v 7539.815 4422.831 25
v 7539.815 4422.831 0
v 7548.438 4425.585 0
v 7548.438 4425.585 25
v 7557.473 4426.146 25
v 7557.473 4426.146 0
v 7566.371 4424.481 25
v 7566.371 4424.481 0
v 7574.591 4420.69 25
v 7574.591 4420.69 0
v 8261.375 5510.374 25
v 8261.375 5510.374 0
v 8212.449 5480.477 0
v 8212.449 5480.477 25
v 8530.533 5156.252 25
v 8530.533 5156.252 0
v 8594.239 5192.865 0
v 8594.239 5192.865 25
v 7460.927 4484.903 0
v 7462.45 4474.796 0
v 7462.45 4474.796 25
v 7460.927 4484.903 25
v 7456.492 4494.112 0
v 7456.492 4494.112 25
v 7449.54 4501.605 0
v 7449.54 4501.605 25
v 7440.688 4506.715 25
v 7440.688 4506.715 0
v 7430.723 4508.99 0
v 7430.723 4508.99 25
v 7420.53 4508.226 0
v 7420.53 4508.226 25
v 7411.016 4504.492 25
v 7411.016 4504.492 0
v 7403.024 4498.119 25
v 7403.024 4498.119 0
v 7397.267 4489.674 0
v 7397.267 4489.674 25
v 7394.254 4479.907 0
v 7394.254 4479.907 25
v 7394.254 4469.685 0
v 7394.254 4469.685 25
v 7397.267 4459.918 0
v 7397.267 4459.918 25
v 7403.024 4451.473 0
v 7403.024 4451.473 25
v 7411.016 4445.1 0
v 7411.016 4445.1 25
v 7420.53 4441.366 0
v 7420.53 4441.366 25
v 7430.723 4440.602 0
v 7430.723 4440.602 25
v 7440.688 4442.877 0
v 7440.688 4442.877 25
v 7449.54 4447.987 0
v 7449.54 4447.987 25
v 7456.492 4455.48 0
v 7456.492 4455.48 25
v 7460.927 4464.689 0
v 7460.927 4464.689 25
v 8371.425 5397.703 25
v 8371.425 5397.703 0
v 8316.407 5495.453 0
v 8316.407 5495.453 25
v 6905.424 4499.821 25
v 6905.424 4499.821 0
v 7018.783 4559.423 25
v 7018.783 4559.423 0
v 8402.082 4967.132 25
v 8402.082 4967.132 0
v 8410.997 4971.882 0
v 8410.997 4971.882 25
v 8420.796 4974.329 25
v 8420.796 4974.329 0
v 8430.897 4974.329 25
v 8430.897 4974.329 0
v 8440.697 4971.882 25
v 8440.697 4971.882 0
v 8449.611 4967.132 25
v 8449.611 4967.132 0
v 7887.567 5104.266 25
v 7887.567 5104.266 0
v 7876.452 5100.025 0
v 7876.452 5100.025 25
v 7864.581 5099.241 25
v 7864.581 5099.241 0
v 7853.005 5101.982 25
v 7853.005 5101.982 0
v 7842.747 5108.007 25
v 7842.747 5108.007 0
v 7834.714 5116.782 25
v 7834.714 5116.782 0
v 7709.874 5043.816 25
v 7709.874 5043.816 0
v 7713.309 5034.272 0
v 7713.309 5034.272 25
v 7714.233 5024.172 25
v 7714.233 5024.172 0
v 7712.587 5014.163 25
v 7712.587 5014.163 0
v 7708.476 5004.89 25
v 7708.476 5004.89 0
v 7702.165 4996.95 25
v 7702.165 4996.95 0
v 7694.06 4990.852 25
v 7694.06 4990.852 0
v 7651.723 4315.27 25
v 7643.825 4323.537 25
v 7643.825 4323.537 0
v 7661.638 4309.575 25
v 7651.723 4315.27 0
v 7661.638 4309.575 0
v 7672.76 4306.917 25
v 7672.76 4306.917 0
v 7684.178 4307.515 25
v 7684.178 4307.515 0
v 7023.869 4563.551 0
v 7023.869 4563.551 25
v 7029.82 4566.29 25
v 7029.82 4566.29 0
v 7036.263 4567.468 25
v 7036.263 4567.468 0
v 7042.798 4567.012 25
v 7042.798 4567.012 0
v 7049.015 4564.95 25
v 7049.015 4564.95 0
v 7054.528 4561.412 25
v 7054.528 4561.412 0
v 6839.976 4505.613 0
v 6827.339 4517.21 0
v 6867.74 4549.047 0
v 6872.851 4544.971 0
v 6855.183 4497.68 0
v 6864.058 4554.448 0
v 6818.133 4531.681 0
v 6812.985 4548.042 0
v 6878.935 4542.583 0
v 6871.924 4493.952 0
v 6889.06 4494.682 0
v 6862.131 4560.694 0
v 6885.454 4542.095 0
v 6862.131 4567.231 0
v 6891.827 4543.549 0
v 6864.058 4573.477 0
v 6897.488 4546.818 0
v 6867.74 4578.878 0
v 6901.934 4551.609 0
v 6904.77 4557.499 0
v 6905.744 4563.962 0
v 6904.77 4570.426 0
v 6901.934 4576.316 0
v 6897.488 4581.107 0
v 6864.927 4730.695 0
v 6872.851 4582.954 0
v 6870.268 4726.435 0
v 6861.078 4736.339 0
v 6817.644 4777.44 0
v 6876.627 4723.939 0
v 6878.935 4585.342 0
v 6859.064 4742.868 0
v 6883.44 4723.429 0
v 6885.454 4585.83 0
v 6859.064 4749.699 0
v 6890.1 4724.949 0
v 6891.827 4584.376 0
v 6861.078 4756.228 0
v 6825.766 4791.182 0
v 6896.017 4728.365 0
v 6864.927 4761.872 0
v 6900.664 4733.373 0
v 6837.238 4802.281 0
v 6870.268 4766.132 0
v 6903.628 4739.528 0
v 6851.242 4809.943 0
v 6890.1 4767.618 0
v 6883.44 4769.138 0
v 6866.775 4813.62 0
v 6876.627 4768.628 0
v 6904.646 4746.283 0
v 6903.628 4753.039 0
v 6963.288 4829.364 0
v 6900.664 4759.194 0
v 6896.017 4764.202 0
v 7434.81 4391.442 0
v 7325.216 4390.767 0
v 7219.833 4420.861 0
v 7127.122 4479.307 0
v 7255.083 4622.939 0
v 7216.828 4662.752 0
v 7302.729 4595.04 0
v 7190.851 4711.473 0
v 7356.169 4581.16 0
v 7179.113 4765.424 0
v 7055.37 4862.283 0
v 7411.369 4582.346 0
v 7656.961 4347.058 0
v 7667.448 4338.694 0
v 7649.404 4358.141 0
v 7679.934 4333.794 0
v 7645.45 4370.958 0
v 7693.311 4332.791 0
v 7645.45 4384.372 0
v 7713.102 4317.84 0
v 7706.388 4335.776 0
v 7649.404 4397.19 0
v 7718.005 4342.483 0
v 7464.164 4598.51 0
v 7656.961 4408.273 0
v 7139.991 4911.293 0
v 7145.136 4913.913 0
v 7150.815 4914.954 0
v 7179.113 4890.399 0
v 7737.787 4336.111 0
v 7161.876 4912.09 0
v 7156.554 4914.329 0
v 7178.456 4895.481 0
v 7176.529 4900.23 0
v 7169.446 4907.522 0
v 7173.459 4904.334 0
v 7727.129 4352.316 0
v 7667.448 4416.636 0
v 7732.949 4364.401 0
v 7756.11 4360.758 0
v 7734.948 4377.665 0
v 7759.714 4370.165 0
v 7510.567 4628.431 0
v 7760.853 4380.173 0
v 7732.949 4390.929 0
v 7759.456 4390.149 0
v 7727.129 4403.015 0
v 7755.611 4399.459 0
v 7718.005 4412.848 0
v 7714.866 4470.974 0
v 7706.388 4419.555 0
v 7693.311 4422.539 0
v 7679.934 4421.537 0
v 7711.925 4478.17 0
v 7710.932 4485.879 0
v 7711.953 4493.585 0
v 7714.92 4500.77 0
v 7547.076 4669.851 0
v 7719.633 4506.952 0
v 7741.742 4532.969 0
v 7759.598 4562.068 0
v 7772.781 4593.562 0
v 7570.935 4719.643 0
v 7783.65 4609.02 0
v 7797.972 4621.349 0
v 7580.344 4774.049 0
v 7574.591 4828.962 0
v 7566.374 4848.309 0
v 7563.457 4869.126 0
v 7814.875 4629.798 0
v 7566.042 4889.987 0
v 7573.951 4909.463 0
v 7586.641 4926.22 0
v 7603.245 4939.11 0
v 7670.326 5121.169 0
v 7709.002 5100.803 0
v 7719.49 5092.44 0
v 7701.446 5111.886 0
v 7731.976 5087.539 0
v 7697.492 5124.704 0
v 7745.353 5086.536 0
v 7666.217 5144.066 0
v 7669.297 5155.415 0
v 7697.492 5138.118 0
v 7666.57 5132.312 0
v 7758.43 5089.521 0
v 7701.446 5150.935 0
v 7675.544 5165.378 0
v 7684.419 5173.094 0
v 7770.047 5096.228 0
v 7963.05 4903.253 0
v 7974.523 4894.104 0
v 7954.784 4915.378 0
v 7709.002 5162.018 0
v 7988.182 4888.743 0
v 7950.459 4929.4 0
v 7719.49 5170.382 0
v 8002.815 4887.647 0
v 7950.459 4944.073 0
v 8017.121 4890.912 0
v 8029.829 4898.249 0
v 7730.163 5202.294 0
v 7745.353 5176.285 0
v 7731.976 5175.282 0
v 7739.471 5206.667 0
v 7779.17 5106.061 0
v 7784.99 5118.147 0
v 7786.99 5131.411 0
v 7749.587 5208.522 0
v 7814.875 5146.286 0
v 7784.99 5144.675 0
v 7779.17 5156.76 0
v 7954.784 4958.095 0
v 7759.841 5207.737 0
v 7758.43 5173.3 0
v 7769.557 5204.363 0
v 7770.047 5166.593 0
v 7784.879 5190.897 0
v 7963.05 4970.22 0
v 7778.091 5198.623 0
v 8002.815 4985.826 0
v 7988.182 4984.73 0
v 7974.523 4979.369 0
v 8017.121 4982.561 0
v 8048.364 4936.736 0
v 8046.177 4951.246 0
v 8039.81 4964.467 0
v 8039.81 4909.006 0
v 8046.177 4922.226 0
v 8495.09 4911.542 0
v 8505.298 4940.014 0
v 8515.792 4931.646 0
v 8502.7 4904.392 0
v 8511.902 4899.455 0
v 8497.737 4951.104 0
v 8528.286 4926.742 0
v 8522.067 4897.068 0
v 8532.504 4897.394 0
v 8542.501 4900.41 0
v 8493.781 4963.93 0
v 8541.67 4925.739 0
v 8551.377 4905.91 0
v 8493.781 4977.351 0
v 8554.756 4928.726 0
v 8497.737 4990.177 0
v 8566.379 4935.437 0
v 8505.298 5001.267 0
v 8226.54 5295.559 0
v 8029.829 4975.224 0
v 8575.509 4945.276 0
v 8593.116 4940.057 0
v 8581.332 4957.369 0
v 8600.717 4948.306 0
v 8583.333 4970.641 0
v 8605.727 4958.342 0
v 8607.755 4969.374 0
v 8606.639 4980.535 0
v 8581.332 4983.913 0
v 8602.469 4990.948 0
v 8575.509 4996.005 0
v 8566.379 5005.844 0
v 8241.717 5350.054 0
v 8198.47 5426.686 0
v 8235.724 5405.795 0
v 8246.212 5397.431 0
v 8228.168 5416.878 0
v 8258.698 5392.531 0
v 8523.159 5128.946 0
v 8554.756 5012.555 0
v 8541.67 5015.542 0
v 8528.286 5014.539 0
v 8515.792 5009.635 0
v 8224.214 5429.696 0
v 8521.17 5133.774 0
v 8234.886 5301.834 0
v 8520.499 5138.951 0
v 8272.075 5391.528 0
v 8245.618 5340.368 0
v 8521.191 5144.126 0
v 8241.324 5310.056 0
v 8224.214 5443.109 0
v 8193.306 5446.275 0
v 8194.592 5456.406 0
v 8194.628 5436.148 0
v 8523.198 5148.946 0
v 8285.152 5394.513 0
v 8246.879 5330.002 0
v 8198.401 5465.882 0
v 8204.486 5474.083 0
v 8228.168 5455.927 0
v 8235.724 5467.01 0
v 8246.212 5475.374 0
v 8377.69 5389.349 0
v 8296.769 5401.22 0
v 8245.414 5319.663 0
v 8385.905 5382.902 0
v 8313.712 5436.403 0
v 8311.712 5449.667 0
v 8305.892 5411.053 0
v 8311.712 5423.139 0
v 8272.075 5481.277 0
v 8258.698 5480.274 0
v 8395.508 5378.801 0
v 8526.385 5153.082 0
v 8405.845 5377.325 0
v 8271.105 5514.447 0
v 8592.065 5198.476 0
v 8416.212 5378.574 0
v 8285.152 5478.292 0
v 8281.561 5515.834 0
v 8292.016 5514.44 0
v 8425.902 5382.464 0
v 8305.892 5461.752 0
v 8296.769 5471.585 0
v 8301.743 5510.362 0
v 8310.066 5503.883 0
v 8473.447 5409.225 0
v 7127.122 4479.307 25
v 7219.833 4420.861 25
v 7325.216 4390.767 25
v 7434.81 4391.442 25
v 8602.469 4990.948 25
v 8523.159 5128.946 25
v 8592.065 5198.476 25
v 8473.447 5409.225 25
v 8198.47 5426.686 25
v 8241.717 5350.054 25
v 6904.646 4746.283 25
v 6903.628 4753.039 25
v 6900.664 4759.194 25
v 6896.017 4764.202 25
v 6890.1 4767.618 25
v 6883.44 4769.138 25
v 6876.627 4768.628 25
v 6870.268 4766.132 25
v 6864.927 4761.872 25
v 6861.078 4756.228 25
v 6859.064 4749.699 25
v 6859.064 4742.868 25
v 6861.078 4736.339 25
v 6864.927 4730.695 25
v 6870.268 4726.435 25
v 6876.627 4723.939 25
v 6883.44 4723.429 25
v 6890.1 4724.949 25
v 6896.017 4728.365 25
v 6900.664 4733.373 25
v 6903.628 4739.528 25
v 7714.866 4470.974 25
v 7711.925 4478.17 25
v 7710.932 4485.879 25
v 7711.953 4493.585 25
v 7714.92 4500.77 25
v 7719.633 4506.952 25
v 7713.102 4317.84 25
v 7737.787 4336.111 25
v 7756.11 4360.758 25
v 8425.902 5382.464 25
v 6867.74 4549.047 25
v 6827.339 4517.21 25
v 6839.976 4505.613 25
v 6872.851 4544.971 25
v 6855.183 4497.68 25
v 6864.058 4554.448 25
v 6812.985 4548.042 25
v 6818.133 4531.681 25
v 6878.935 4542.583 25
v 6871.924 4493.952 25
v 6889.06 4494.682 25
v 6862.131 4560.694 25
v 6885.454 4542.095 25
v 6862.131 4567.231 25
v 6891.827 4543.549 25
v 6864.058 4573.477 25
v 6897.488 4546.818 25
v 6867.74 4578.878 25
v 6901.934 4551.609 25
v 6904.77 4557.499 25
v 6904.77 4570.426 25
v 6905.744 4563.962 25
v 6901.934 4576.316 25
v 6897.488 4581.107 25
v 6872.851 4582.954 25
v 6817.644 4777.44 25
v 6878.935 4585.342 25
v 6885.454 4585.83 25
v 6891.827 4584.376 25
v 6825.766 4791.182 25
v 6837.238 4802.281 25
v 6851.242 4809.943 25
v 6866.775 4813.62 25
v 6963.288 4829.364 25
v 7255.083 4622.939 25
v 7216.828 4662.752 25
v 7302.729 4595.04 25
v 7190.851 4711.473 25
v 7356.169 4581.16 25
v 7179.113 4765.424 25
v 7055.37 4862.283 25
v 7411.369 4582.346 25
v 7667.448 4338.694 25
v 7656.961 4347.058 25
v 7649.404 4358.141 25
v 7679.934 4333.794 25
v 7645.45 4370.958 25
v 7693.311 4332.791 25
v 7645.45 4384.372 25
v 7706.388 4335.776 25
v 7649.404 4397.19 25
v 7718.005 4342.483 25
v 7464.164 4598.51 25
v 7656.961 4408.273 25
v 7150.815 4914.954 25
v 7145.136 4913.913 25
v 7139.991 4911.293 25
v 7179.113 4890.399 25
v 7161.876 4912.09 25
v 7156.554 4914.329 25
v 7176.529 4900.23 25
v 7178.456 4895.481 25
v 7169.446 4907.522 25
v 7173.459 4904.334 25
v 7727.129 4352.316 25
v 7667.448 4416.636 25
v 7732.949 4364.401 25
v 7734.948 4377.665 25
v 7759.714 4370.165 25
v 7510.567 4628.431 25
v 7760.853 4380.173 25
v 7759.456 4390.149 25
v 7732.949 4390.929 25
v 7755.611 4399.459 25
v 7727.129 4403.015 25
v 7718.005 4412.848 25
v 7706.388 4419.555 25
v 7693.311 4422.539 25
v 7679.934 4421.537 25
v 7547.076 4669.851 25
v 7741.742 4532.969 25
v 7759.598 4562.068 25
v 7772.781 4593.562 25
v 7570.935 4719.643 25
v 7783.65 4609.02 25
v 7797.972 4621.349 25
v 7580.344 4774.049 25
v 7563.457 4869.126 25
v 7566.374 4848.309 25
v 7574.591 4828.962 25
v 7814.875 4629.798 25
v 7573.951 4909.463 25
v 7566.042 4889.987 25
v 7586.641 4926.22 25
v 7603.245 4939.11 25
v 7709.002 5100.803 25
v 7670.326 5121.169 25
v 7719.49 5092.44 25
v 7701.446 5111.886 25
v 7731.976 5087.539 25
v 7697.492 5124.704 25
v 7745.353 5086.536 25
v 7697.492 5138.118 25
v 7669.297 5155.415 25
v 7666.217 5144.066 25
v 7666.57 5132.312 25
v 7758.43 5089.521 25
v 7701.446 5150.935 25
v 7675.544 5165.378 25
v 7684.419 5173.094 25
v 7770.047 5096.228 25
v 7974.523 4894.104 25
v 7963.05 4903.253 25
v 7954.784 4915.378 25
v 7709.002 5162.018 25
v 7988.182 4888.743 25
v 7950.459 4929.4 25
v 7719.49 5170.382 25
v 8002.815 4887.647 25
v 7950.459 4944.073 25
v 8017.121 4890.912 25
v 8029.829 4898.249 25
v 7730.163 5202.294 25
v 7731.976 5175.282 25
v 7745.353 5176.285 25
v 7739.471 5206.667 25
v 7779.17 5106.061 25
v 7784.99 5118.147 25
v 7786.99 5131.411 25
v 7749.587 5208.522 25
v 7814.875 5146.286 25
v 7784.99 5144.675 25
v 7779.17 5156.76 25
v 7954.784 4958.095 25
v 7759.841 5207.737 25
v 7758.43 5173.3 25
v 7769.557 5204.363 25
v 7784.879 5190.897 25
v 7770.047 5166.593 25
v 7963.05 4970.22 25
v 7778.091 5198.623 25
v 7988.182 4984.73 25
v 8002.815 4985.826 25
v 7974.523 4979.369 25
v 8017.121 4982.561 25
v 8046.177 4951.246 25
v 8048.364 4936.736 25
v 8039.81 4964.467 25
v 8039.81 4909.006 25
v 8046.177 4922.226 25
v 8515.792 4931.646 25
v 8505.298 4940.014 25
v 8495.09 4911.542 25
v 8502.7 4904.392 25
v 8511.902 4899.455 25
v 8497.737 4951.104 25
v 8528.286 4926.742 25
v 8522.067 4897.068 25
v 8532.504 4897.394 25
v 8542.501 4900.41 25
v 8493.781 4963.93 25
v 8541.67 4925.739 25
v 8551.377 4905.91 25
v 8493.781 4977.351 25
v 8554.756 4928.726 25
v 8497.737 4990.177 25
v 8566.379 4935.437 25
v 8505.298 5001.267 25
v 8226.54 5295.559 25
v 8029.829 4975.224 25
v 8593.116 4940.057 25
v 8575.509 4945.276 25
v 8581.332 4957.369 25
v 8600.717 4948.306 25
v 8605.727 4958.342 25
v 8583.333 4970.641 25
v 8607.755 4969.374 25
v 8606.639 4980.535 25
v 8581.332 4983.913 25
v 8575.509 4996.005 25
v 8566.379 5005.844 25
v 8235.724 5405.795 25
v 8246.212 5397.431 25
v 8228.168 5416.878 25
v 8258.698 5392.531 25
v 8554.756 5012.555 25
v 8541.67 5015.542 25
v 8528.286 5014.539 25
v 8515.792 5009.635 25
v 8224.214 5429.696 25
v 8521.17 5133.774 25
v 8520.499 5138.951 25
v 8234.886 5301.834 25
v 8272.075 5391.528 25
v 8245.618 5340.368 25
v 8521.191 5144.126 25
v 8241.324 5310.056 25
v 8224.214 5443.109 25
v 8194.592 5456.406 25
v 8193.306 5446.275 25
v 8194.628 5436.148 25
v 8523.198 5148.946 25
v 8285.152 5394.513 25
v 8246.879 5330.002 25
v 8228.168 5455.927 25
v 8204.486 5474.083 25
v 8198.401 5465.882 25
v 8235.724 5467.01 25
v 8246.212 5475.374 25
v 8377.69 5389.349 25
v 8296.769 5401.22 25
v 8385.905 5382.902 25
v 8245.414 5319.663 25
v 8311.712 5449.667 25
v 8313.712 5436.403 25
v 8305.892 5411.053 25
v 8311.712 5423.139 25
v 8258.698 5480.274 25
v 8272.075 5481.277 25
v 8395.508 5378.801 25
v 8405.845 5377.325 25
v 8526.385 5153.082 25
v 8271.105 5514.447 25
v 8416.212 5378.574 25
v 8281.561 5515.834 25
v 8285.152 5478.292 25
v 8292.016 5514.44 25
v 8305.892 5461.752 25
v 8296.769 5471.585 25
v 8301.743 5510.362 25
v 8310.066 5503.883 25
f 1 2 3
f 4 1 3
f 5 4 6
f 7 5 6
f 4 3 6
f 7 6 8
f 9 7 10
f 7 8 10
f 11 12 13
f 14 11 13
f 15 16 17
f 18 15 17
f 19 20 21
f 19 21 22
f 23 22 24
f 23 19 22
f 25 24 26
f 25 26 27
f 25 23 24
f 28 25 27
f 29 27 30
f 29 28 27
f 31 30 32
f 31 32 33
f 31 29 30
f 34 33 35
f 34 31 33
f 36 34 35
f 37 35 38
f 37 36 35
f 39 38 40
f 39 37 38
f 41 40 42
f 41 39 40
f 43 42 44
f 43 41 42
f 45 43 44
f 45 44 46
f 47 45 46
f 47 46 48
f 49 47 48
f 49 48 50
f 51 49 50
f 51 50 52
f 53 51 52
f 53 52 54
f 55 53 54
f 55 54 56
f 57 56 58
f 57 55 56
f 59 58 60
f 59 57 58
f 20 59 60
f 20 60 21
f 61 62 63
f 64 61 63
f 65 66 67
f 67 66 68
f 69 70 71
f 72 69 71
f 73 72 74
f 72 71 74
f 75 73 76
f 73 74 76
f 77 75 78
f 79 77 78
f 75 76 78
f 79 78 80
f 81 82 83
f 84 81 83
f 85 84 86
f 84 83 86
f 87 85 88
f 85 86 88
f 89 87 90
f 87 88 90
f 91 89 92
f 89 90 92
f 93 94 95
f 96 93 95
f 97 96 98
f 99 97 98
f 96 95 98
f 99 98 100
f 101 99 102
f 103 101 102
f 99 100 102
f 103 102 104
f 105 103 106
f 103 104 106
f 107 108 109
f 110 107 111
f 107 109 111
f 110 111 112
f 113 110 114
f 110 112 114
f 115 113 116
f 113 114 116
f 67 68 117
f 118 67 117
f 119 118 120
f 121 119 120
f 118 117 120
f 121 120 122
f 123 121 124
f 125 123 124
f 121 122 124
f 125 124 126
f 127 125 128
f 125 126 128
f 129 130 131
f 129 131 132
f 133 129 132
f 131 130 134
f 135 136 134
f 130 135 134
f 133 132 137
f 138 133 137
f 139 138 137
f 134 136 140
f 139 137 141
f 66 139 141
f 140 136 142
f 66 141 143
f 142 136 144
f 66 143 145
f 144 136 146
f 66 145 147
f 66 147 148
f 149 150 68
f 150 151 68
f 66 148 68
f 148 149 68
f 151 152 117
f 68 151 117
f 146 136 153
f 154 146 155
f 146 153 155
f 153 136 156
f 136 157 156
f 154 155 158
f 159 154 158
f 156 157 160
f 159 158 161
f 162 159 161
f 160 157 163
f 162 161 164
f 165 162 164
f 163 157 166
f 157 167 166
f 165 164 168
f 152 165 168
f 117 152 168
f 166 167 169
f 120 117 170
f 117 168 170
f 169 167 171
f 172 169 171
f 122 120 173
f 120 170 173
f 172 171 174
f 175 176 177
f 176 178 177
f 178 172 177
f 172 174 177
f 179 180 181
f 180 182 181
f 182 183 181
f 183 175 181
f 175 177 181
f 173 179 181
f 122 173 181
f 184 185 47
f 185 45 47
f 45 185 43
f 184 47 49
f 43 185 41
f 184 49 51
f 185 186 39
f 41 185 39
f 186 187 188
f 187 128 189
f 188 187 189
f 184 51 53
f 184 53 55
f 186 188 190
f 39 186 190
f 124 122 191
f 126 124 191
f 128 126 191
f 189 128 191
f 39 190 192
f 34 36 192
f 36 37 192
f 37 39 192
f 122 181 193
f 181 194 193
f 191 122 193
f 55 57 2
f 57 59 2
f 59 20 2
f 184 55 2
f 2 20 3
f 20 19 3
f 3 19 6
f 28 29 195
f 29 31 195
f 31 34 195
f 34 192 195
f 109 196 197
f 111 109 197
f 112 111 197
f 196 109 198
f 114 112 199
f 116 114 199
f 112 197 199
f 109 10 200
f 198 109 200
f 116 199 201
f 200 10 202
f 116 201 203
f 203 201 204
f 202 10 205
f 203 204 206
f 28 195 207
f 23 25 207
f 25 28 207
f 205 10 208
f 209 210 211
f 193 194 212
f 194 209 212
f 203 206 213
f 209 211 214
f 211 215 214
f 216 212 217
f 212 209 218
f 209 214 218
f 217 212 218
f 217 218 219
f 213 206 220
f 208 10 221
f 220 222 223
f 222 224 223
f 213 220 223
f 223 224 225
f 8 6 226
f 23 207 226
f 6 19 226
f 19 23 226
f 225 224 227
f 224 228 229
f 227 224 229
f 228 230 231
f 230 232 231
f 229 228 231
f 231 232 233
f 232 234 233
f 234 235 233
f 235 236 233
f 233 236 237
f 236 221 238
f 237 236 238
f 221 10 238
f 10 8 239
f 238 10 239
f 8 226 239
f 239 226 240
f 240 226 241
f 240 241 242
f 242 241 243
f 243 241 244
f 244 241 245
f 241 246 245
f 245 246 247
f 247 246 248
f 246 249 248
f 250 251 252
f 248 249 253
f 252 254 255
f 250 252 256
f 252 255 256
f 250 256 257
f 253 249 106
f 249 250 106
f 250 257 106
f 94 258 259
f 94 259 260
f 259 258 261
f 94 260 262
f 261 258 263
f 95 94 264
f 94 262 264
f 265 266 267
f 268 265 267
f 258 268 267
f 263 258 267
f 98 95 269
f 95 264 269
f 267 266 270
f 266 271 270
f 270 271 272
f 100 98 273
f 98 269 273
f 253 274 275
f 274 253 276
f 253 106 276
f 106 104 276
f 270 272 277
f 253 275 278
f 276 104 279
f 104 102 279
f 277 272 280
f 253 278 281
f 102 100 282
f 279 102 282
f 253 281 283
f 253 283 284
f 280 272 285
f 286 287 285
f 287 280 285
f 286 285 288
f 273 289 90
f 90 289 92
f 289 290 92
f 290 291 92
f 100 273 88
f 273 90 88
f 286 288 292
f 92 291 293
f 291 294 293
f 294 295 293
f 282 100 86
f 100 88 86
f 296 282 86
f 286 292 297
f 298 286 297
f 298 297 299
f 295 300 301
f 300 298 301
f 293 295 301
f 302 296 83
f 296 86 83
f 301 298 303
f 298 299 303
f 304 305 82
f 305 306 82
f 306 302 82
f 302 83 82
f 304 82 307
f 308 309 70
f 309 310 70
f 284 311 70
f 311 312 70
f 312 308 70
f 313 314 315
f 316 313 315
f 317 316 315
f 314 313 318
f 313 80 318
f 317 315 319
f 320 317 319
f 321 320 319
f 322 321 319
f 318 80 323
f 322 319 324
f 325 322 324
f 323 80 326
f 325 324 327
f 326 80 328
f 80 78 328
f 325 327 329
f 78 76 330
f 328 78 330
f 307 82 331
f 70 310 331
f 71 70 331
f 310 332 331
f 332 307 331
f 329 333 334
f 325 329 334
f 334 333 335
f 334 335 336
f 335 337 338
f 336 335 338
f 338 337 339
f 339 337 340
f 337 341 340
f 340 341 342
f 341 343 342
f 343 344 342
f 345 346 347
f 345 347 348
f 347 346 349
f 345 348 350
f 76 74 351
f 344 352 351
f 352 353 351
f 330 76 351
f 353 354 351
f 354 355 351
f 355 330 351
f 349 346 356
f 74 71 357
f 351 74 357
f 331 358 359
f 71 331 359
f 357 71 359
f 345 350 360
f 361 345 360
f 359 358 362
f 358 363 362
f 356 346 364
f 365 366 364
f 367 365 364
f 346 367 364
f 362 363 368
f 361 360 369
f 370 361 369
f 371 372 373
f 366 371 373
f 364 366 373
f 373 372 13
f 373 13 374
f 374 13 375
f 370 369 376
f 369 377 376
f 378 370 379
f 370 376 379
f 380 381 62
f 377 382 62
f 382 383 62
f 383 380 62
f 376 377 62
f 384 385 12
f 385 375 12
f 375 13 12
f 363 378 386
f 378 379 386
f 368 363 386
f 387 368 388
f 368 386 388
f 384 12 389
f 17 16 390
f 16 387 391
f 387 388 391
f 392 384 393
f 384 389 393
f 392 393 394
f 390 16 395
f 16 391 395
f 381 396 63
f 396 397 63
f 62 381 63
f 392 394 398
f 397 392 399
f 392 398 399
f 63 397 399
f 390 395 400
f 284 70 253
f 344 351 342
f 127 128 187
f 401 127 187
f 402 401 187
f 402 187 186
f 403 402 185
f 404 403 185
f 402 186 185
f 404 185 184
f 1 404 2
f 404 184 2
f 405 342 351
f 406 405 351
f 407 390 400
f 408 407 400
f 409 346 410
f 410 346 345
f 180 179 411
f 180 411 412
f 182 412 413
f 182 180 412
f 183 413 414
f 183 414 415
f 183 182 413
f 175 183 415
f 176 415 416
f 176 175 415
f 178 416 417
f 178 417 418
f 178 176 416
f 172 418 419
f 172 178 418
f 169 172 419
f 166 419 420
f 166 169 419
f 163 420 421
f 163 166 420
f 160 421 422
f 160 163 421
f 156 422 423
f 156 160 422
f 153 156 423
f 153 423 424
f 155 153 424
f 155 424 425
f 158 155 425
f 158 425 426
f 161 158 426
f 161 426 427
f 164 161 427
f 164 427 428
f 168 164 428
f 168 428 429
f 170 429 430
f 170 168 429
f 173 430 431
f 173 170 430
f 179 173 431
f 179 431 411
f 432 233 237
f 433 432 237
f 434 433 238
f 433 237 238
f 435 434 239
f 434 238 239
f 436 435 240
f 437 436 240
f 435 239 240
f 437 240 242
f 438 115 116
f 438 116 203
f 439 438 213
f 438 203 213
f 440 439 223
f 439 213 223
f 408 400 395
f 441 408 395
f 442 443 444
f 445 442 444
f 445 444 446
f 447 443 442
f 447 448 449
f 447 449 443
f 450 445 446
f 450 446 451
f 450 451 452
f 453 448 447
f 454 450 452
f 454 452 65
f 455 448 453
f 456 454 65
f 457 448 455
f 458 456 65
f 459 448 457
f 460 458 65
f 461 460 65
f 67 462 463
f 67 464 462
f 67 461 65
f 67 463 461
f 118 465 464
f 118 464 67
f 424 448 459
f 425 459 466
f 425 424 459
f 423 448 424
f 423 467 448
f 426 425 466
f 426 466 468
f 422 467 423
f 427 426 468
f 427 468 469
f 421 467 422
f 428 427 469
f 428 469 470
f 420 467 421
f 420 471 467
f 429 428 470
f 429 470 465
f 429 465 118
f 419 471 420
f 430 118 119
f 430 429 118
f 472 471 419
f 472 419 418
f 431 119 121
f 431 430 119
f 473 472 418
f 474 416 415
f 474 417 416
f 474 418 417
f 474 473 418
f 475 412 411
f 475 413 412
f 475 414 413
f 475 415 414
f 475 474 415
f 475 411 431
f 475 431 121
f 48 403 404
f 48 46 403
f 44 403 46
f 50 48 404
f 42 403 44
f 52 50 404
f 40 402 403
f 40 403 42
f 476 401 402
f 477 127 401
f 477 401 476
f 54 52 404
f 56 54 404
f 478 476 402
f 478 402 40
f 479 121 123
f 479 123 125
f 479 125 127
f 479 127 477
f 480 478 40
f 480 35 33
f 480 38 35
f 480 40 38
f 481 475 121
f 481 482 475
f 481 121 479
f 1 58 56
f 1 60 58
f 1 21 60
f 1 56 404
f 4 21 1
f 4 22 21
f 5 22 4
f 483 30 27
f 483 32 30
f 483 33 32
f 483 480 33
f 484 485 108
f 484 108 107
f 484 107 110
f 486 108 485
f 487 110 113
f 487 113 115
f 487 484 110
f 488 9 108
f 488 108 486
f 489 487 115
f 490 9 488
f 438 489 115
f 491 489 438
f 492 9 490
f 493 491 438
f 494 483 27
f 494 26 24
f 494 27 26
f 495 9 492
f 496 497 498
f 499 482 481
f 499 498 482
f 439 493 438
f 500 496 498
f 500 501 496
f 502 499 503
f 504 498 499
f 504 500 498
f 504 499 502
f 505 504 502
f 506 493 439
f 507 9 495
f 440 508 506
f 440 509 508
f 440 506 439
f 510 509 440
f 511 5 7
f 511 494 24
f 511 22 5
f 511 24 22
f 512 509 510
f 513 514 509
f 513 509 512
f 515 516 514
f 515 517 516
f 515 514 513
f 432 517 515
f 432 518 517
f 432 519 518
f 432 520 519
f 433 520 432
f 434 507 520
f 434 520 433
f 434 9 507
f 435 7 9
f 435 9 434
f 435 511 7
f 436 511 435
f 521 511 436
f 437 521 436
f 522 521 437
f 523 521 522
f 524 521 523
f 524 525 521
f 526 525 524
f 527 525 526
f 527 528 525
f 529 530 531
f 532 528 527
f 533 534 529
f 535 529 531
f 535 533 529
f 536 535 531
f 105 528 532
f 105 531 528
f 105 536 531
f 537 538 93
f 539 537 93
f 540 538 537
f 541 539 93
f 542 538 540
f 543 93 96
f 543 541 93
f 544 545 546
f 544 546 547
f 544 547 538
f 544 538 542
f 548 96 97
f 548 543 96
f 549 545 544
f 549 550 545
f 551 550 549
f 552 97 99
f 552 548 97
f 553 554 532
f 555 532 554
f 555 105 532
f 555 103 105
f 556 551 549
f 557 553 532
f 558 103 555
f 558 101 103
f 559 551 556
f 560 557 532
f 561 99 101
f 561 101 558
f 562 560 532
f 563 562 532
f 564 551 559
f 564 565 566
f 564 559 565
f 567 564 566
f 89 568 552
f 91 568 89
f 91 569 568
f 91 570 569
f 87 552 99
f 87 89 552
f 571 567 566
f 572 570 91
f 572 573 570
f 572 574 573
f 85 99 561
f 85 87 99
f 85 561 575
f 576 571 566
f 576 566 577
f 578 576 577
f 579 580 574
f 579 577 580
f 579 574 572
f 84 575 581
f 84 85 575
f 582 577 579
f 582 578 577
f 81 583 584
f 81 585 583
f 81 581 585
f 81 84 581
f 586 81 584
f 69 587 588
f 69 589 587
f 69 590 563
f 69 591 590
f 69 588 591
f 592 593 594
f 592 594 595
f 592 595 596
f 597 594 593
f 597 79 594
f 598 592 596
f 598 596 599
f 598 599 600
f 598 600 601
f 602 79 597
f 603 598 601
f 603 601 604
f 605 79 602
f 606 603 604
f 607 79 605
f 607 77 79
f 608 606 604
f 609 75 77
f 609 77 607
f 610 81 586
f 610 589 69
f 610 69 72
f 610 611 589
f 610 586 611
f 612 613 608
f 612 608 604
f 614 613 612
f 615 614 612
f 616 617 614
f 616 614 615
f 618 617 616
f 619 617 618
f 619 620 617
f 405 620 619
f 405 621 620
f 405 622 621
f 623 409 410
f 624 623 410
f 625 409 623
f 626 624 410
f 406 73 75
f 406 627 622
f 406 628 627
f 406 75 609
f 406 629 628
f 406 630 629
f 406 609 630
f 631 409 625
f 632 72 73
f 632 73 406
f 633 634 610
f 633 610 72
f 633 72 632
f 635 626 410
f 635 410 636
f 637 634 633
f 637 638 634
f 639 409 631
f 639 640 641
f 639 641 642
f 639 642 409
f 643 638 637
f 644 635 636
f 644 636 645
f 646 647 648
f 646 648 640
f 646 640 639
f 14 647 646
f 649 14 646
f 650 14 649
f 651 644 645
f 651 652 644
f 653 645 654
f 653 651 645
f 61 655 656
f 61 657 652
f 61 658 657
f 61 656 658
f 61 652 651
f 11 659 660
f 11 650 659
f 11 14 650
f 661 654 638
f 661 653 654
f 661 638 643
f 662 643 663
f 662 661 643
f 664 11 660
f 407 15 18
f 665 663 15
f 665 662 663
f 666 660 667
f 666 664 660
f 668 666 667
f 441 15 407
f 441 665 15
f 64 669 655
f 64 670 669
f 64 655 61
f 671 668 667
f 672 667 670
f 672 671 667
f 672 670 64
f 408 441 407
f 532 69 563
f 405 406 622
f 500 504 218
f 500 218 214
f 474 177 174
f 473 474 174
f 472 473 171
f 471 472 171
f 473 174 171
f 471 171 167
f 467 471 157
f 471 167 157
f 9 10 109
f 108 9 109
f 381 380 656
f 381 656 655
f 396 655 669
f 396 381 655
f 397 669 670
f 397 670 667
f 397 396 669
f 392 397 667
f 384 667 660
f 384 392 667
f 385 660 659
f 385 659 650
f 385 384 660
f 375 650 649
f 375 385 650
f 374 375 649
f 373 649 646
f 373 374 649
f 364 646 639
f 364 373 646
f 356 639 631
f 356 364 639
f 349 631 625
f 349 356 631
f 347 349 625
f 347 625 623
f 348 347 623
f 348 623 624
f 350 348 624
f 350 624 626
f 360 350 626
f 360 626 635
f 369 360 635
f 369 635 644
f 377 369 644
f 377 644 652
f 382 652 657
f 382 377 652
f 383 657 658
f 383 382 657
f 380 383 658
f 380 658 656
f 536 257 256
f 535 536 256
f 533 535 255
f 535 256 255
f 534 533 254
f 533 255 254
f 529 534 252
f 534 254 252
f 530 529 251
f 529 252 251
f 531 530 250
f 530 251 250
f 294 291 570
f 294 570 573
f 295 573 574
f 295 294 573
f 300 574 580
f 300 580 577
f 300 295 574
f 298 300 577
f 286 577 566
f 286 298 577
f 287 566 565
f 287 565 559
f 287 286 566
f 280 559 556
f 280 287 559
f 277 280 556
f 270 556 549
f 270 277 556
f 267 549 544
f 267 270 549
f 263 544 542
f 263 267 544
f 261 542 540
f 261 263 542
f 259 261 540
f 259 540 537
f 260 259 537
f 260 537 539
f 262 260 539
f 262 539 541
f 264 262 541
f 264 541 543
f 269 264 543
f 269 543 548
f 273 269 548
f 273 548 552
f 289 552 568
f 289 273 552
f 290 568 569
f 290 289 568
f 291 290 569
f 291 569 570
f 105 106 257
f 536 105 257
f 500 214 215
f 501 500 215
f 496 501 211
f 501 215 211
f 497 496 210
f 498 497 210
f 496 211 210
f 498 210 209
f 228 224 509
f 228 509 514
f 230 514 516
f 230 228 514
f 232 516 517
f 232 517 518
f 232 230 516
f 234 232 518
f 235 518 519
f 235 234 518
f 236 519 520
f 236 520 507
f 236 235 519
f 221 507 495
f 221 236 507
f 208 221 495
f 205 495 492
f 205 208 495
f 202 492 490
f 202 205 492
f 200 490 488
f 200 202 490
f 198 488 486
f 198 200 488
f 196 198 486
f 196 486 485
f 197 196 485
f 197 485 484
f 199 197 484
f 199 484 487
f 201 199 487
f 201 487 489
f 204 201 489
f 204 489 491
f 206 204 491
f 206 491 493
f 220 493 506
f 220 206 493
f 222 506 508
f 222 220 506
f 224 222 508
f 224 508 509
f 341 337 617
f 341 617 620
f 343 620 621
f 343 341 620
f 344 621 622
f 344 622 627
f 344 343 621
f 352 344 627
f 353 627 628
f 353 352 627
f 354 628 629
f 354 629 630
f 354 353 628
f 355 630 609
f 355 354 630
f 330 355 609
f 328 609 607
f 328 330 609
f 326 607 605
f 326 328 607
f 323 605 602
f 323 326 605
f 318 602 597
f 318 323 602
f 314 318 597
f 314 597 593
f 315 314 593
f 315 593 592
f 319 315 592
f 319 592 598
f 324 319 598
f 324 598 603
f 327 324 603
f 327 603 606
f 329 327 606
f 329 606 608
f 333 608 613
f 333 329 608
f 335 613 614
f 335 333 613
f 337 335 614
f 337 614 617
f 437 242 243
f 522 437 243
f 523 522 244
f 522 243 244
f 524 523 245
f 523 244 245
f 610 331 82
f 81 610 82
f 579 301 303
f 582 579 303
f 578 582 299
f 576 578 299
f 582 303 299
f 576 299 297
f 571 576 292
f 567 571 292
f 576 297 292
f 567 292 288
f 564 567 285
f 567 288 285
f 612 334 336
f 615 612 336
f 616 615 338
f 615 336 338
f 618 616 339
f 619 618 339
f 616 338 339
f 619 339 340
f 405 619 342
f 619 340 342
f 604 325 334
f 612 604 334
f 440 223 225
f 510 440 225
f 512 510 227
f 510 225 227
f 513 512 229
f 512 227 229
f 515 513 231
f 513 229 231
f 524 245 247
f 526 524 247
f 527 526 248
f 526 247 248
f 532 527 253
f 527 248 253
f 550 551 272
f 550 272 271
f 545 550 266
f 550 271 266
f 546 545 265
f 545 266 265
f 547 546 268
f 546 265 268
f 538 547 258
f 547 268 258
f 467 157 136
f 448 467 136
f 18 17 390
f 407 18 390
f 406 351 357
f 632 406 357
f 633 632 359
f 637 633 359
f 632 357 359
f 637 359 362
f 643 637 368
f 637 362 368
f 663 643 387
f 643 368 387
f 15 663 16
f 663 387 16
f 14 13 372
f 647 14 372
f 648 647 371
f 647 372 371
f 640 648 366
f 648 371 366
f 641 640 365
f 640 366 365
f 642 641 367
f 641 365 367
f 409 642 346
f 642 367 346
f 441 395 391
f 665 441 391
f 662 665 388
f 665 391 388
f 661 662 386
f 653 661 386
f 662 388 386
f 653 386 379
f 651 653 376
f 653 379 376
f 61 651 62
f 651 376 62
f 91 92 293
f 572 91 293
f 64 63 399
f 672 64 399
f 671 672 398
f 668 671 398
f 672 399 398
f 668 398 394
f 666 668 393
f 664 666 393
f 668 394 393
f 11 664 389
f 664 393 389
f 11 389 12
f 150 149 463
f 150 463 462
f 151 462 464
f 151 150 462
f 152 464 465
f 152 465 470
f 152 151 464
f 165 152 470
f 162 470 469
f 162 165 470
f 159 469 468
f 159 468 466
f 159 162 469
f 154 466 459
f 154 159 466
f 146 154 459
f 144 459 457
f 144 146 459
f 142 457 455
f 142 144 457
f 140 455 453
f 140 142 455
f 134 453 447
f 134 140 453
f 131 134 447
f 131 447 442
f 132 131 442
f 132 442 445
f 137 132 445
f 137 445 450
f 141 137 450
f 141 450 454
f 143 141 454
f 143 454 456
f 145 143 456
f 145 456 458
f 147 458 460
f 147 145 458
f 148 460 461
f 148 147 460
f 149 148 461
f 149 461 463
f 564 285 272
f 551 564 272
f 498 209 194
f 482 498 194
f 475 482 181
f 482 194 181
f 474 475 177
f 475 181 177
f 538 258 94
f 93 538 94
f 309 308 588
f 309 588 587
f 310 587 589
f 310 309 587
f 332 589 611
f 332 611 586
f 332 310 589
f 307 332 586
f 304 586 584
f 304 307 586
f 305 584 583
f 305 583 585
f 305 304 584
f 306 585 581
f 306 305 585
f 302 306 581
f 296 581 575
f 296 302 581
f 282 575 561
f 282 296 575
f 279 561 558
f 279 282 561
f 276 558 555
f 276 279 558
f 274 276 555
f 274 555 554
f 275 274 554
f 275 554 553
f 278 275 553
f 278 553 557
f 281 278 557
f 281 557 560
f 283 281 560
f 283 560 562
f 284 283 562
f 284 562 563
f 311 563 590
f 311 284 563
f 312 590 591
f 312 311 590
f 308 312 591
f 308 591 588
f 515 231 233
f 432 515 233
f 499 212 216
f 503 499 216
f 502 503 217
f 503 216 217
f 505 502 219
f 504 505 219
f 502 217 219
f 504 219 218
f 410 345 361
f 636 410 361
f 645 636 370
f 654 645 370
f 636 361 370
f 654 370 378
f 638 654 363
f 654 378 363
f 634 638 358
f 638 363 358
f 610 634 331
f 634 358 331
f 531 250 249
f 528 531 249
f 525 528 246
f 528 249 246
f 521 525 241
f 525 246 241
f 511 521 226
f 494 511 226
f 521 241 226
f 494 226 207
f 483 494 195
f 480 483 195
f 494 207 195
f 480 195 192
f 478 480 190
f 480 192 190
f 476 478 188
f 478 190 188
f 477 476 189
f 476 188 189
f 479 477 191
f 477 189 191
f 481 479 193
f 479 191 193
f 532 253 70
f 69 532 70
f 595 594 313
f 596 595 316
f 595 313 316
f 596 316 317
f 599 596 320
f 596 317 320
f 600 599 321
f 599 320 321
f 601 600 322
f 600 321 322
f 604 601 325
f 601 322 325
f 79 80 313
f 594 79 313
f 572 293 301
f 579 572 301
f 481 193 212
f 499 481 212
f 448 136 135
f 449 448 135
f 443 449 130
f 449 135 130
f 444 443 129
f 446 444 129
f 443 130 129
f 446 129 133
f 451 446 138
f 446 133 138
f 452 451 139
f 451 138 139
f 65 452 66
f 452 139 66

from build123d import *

# Parameters (mm, degrees)
ESBO_O1_R                = 49.227306986
ESBO_O1_R_2              = 45.027223586
ESBO_O1_R_3              = 34.289668097
ESBO_O1_R_4              = 45
ESBO_O1_R_5              = 22.918852427
ESBO_O1_R_6              = 21.929059038
RESSALTO_EXTRUS_O1_DEPTH = 25


with BuildPart() as part:
    # Esboço1 → Ressalto-extrusão1 (new body)
    with BuildSketch(Plane.XY):
        with BuildLine():
            Line((8592.065409332, 5198.475728322), (8473.447242619, 5409.224509958))
            Line((8473.447242619, 5409.224509958), (8425.902270717, 5382.464225227))
            ThreePointArc((8425.902270717, 5382.464225227), (8395.507573393, 5378.800801313), (8371.424844911, 5397.702666012))
            Line((8371.424844911, 5397.702666012), (8316.40665203, 5495.453435889))
            ThreePointArc((8316.40665203, 5495.453435889), (8292.016223819, 5514.440048301), (8261.375488437, 5510.374365776))
            Line((8261.375488437, 5510.374365776), (8212.449282848, 5480.477339997))
            ThreePointArc((8212.449282848, 5480.477339997), (8194.592026382, 5456.406171561), (8198.470371474, 5426.686460968))
            Line((8198.470371474, 5426.686460968), (8241.716603514, 5350.053723792))
            ThreePointArc((8241.716603514, 5350.053723792), (8245.414384596, 5319.663187185), (8226.539756155, 5295.559106588))
            Line((8226.539756155, 5295.559106588), (7887.56689815, 5104.266202112))
            ThreePointArc((7887.56689815, 5104.266202112), (7858.690563236, 5100.178437433), (7834.71418175, 5116.782222212))
            Line((7834.71418175, 5116.782222212), (7814.875485509, 5146.286291727))
            Line((7814.875485509, 5146.286291727), (7784.878848462, 5190.897230564))
            ThreePointArc((7784.878848462, 5190.897230564), (7759.841470177, 5207.737092835), (7730.162808648, 5202.293902357))
            Line((7730.162808648, 5202.293902357), (7684.418563925, 5173.093939339))
            ThreePointArc((7684.418563925, 5173.093939339), (7667.337308495, 5149.854796663), (7670.325681174, 5121.168621105))
            Line((7670.325681174, 5121.168621105), (7709.87388758, 5043.81577039))
            ThreePointArc((7709.87388758, 5043.81577039), (7712.586860583, 5014.16308224), (7694.060285678, 4990.851965593))
            Line((7694.060285678, 4990.851965593), (7603.245211769, 4939.110334103))
            ThreePointArc((7603.245211769, 4939.110334103), (7566.042022636, 4889.986984267), (7574.591315044, 4828.961658539))
            ThreePointArc((7574.591315044, 4828.961658539), (7411.369433565, 4582.346099234), (7179.112865973, 4765.423961074))
            Line((7179.112865973, 4765.423961074), (7179.112865973, 4890.398526732))
            ThreePointArc((7179.112865973, 4890.398526732), (7176.529401806, 4900.23032614), (7169.446438014, 4907.522115401))
            Line((7169.446438014, 4907.522115401), (7161.87645403, 4912.09037363))
            ThreePointArc((7161.87645403, 4912.09037363), (7150.814869868, 4914.953530528), (7139.99090215, 4911.293197972))
            ThreePointArc((7139.99090215, 4911.293197972), (7010.077113446, 4843.731348706), (6866.77493755, 4813.620182095))
            ThreePointArc((6866.77493755, 4813.620182095), (6837.238365249, 4802.28095325), (6817.644330707, 4777.440240208))
            Line((6817.644330707, 4777.440240208), (6812.984670077, 4548.041588809))
            ThreePointArc((6812.984670077, 4548.041588809), (6847.319630156, 4501.148504338), (6905.423739633, 4499.820604987))
            Line((6905.423739633, 4499.820604987), (7018.783227578, 4559.423081996))
            ThreePointArc((7018.783227578, 4559.423081996), (7036.263274842, 4567.468257298), (7054.527862902, 4561.411713646))
            ThreePointArc((7054.527862902, 4561.411713646), (7271.453583291, 4402.062402746), (7539.814575965, 4422.831337767))
            ThreePointArc((7539.814575965, 4422.831337767), (7557.472949269, 4426.146472293), (7574.591376366, 4420.690492236))
            Line((7574.591376366, 4420.690492236), (7643.824786877, 4323.537498877))
            ThreePointArc((7643.824786877, 4323.537498877), (7661.638348099, 4309.574510741), (7684.1782089, 4307.51473498))
            ThreePointArc((7684.1782089, 4307.51473498), (7726.117997258, 4326.065711445), (7756.109950671, 4360.758179011))
            ThreePointArc((7756.109950671, 4360.758179011), (7760.853190032, 4380.173039859), (7755.611379393, 4399.459267136))
            Line((7755.611379393, 4399.459267136), (7714.866132222, 4470.97387784))
            ThreePointArc((7714.866132222, 4470.97387784), (7711.192216927, 4489.765596658), (7719.63329346, 4506.952061587))
            ThreePointArc((7719.63329346, 4506.952061587), (7751.230180611, 4547.174632919), (7772.780877122, 4593.561980354))
            ThreePointArc((7772.780877122, 4593.561980354), (7790.429838997, 4615.627863403), (7814.875485509, 4629.798234485))
            Line((7814.875485509, 4629.798234485), (8402.08207018, 4967.132328945))
            ThreePointArc((8402.08207018, 4967.132328945), (8425.846622391, 4974.638589154), (8449.611174603, 4967.132328945))
            Line((8449.611174603, 4967.132328945), (8495.089773791, 4911.541656895))
            ThreePointArc((8495.089773791, 4911.541656895), (8522.067187452, 4897.068320984), (8551.377293559, 4905.910039154))
            Line((8551.377293559, 4905.910039154), (8593.116417231, 4940.056718911))
            ThreePointArc((8593.116417231, 4940.056718911), (8607.129643298, 4963.786364709), (8602.468925751, 4990.947813611))
            Line((8602.468925751, 4990.947813611), (8523.158682911, 5128.94606196))
            ThreePointArc((8523.158682911, 5128.94606196), (8521.190660044, 5144.12636041), (8530.533149704, 5156.2520547))
            Line((8530.533149704, 5156.2520547), (8594.238523916, 5192.864756379))
            Line((8594.238523916, 5192.864756379), (8592.065409332, 5198.475728322))
        make_face()
        with Locations((7999.136389936, 4936.736467004)):
            Circle(ESBO_O1_R, mode=Mode.SUBTRACT)
        with Locations((8538.305471244, 4970.64052635)):
            Circle(ESBO_O1_R_2, mode=Mode.SUBTRACT)
        with Locations((7428.160556208, 4474.796077944)):
            Circle(ESBO_O1_R_3, mode=Mode.SUBTRACT)
        with Locations((7689.94786831, 4377.665287462)):
            Circle(ESBO_O1_R_4, mode=Mode.SUBTRACT)
        with Locations((6881.727296698, 4746.283471792)):
            Circle(ESBO_O1_R_5, mode=Mode.SUBTRACT)
        with Locations((6883.815097675, 4563.962455068)):
            Circle(ESBO_O1_R_6, mode=Mode.SUBTRACT)
        with Locations((7741.989693859, 5131.410658858)):
            Circle(ESBO_O1_R_4, mode=Mode.SUBTRACT)
        with Locations((8268.711651115, 5436.402584307)):
            Circle(ESBO_O1_R_4, mode=Mode.SUBTRACT)
    extrude(amount=RESSALTO_EXTRUS_O1_DEPTH)


solid = part.part
